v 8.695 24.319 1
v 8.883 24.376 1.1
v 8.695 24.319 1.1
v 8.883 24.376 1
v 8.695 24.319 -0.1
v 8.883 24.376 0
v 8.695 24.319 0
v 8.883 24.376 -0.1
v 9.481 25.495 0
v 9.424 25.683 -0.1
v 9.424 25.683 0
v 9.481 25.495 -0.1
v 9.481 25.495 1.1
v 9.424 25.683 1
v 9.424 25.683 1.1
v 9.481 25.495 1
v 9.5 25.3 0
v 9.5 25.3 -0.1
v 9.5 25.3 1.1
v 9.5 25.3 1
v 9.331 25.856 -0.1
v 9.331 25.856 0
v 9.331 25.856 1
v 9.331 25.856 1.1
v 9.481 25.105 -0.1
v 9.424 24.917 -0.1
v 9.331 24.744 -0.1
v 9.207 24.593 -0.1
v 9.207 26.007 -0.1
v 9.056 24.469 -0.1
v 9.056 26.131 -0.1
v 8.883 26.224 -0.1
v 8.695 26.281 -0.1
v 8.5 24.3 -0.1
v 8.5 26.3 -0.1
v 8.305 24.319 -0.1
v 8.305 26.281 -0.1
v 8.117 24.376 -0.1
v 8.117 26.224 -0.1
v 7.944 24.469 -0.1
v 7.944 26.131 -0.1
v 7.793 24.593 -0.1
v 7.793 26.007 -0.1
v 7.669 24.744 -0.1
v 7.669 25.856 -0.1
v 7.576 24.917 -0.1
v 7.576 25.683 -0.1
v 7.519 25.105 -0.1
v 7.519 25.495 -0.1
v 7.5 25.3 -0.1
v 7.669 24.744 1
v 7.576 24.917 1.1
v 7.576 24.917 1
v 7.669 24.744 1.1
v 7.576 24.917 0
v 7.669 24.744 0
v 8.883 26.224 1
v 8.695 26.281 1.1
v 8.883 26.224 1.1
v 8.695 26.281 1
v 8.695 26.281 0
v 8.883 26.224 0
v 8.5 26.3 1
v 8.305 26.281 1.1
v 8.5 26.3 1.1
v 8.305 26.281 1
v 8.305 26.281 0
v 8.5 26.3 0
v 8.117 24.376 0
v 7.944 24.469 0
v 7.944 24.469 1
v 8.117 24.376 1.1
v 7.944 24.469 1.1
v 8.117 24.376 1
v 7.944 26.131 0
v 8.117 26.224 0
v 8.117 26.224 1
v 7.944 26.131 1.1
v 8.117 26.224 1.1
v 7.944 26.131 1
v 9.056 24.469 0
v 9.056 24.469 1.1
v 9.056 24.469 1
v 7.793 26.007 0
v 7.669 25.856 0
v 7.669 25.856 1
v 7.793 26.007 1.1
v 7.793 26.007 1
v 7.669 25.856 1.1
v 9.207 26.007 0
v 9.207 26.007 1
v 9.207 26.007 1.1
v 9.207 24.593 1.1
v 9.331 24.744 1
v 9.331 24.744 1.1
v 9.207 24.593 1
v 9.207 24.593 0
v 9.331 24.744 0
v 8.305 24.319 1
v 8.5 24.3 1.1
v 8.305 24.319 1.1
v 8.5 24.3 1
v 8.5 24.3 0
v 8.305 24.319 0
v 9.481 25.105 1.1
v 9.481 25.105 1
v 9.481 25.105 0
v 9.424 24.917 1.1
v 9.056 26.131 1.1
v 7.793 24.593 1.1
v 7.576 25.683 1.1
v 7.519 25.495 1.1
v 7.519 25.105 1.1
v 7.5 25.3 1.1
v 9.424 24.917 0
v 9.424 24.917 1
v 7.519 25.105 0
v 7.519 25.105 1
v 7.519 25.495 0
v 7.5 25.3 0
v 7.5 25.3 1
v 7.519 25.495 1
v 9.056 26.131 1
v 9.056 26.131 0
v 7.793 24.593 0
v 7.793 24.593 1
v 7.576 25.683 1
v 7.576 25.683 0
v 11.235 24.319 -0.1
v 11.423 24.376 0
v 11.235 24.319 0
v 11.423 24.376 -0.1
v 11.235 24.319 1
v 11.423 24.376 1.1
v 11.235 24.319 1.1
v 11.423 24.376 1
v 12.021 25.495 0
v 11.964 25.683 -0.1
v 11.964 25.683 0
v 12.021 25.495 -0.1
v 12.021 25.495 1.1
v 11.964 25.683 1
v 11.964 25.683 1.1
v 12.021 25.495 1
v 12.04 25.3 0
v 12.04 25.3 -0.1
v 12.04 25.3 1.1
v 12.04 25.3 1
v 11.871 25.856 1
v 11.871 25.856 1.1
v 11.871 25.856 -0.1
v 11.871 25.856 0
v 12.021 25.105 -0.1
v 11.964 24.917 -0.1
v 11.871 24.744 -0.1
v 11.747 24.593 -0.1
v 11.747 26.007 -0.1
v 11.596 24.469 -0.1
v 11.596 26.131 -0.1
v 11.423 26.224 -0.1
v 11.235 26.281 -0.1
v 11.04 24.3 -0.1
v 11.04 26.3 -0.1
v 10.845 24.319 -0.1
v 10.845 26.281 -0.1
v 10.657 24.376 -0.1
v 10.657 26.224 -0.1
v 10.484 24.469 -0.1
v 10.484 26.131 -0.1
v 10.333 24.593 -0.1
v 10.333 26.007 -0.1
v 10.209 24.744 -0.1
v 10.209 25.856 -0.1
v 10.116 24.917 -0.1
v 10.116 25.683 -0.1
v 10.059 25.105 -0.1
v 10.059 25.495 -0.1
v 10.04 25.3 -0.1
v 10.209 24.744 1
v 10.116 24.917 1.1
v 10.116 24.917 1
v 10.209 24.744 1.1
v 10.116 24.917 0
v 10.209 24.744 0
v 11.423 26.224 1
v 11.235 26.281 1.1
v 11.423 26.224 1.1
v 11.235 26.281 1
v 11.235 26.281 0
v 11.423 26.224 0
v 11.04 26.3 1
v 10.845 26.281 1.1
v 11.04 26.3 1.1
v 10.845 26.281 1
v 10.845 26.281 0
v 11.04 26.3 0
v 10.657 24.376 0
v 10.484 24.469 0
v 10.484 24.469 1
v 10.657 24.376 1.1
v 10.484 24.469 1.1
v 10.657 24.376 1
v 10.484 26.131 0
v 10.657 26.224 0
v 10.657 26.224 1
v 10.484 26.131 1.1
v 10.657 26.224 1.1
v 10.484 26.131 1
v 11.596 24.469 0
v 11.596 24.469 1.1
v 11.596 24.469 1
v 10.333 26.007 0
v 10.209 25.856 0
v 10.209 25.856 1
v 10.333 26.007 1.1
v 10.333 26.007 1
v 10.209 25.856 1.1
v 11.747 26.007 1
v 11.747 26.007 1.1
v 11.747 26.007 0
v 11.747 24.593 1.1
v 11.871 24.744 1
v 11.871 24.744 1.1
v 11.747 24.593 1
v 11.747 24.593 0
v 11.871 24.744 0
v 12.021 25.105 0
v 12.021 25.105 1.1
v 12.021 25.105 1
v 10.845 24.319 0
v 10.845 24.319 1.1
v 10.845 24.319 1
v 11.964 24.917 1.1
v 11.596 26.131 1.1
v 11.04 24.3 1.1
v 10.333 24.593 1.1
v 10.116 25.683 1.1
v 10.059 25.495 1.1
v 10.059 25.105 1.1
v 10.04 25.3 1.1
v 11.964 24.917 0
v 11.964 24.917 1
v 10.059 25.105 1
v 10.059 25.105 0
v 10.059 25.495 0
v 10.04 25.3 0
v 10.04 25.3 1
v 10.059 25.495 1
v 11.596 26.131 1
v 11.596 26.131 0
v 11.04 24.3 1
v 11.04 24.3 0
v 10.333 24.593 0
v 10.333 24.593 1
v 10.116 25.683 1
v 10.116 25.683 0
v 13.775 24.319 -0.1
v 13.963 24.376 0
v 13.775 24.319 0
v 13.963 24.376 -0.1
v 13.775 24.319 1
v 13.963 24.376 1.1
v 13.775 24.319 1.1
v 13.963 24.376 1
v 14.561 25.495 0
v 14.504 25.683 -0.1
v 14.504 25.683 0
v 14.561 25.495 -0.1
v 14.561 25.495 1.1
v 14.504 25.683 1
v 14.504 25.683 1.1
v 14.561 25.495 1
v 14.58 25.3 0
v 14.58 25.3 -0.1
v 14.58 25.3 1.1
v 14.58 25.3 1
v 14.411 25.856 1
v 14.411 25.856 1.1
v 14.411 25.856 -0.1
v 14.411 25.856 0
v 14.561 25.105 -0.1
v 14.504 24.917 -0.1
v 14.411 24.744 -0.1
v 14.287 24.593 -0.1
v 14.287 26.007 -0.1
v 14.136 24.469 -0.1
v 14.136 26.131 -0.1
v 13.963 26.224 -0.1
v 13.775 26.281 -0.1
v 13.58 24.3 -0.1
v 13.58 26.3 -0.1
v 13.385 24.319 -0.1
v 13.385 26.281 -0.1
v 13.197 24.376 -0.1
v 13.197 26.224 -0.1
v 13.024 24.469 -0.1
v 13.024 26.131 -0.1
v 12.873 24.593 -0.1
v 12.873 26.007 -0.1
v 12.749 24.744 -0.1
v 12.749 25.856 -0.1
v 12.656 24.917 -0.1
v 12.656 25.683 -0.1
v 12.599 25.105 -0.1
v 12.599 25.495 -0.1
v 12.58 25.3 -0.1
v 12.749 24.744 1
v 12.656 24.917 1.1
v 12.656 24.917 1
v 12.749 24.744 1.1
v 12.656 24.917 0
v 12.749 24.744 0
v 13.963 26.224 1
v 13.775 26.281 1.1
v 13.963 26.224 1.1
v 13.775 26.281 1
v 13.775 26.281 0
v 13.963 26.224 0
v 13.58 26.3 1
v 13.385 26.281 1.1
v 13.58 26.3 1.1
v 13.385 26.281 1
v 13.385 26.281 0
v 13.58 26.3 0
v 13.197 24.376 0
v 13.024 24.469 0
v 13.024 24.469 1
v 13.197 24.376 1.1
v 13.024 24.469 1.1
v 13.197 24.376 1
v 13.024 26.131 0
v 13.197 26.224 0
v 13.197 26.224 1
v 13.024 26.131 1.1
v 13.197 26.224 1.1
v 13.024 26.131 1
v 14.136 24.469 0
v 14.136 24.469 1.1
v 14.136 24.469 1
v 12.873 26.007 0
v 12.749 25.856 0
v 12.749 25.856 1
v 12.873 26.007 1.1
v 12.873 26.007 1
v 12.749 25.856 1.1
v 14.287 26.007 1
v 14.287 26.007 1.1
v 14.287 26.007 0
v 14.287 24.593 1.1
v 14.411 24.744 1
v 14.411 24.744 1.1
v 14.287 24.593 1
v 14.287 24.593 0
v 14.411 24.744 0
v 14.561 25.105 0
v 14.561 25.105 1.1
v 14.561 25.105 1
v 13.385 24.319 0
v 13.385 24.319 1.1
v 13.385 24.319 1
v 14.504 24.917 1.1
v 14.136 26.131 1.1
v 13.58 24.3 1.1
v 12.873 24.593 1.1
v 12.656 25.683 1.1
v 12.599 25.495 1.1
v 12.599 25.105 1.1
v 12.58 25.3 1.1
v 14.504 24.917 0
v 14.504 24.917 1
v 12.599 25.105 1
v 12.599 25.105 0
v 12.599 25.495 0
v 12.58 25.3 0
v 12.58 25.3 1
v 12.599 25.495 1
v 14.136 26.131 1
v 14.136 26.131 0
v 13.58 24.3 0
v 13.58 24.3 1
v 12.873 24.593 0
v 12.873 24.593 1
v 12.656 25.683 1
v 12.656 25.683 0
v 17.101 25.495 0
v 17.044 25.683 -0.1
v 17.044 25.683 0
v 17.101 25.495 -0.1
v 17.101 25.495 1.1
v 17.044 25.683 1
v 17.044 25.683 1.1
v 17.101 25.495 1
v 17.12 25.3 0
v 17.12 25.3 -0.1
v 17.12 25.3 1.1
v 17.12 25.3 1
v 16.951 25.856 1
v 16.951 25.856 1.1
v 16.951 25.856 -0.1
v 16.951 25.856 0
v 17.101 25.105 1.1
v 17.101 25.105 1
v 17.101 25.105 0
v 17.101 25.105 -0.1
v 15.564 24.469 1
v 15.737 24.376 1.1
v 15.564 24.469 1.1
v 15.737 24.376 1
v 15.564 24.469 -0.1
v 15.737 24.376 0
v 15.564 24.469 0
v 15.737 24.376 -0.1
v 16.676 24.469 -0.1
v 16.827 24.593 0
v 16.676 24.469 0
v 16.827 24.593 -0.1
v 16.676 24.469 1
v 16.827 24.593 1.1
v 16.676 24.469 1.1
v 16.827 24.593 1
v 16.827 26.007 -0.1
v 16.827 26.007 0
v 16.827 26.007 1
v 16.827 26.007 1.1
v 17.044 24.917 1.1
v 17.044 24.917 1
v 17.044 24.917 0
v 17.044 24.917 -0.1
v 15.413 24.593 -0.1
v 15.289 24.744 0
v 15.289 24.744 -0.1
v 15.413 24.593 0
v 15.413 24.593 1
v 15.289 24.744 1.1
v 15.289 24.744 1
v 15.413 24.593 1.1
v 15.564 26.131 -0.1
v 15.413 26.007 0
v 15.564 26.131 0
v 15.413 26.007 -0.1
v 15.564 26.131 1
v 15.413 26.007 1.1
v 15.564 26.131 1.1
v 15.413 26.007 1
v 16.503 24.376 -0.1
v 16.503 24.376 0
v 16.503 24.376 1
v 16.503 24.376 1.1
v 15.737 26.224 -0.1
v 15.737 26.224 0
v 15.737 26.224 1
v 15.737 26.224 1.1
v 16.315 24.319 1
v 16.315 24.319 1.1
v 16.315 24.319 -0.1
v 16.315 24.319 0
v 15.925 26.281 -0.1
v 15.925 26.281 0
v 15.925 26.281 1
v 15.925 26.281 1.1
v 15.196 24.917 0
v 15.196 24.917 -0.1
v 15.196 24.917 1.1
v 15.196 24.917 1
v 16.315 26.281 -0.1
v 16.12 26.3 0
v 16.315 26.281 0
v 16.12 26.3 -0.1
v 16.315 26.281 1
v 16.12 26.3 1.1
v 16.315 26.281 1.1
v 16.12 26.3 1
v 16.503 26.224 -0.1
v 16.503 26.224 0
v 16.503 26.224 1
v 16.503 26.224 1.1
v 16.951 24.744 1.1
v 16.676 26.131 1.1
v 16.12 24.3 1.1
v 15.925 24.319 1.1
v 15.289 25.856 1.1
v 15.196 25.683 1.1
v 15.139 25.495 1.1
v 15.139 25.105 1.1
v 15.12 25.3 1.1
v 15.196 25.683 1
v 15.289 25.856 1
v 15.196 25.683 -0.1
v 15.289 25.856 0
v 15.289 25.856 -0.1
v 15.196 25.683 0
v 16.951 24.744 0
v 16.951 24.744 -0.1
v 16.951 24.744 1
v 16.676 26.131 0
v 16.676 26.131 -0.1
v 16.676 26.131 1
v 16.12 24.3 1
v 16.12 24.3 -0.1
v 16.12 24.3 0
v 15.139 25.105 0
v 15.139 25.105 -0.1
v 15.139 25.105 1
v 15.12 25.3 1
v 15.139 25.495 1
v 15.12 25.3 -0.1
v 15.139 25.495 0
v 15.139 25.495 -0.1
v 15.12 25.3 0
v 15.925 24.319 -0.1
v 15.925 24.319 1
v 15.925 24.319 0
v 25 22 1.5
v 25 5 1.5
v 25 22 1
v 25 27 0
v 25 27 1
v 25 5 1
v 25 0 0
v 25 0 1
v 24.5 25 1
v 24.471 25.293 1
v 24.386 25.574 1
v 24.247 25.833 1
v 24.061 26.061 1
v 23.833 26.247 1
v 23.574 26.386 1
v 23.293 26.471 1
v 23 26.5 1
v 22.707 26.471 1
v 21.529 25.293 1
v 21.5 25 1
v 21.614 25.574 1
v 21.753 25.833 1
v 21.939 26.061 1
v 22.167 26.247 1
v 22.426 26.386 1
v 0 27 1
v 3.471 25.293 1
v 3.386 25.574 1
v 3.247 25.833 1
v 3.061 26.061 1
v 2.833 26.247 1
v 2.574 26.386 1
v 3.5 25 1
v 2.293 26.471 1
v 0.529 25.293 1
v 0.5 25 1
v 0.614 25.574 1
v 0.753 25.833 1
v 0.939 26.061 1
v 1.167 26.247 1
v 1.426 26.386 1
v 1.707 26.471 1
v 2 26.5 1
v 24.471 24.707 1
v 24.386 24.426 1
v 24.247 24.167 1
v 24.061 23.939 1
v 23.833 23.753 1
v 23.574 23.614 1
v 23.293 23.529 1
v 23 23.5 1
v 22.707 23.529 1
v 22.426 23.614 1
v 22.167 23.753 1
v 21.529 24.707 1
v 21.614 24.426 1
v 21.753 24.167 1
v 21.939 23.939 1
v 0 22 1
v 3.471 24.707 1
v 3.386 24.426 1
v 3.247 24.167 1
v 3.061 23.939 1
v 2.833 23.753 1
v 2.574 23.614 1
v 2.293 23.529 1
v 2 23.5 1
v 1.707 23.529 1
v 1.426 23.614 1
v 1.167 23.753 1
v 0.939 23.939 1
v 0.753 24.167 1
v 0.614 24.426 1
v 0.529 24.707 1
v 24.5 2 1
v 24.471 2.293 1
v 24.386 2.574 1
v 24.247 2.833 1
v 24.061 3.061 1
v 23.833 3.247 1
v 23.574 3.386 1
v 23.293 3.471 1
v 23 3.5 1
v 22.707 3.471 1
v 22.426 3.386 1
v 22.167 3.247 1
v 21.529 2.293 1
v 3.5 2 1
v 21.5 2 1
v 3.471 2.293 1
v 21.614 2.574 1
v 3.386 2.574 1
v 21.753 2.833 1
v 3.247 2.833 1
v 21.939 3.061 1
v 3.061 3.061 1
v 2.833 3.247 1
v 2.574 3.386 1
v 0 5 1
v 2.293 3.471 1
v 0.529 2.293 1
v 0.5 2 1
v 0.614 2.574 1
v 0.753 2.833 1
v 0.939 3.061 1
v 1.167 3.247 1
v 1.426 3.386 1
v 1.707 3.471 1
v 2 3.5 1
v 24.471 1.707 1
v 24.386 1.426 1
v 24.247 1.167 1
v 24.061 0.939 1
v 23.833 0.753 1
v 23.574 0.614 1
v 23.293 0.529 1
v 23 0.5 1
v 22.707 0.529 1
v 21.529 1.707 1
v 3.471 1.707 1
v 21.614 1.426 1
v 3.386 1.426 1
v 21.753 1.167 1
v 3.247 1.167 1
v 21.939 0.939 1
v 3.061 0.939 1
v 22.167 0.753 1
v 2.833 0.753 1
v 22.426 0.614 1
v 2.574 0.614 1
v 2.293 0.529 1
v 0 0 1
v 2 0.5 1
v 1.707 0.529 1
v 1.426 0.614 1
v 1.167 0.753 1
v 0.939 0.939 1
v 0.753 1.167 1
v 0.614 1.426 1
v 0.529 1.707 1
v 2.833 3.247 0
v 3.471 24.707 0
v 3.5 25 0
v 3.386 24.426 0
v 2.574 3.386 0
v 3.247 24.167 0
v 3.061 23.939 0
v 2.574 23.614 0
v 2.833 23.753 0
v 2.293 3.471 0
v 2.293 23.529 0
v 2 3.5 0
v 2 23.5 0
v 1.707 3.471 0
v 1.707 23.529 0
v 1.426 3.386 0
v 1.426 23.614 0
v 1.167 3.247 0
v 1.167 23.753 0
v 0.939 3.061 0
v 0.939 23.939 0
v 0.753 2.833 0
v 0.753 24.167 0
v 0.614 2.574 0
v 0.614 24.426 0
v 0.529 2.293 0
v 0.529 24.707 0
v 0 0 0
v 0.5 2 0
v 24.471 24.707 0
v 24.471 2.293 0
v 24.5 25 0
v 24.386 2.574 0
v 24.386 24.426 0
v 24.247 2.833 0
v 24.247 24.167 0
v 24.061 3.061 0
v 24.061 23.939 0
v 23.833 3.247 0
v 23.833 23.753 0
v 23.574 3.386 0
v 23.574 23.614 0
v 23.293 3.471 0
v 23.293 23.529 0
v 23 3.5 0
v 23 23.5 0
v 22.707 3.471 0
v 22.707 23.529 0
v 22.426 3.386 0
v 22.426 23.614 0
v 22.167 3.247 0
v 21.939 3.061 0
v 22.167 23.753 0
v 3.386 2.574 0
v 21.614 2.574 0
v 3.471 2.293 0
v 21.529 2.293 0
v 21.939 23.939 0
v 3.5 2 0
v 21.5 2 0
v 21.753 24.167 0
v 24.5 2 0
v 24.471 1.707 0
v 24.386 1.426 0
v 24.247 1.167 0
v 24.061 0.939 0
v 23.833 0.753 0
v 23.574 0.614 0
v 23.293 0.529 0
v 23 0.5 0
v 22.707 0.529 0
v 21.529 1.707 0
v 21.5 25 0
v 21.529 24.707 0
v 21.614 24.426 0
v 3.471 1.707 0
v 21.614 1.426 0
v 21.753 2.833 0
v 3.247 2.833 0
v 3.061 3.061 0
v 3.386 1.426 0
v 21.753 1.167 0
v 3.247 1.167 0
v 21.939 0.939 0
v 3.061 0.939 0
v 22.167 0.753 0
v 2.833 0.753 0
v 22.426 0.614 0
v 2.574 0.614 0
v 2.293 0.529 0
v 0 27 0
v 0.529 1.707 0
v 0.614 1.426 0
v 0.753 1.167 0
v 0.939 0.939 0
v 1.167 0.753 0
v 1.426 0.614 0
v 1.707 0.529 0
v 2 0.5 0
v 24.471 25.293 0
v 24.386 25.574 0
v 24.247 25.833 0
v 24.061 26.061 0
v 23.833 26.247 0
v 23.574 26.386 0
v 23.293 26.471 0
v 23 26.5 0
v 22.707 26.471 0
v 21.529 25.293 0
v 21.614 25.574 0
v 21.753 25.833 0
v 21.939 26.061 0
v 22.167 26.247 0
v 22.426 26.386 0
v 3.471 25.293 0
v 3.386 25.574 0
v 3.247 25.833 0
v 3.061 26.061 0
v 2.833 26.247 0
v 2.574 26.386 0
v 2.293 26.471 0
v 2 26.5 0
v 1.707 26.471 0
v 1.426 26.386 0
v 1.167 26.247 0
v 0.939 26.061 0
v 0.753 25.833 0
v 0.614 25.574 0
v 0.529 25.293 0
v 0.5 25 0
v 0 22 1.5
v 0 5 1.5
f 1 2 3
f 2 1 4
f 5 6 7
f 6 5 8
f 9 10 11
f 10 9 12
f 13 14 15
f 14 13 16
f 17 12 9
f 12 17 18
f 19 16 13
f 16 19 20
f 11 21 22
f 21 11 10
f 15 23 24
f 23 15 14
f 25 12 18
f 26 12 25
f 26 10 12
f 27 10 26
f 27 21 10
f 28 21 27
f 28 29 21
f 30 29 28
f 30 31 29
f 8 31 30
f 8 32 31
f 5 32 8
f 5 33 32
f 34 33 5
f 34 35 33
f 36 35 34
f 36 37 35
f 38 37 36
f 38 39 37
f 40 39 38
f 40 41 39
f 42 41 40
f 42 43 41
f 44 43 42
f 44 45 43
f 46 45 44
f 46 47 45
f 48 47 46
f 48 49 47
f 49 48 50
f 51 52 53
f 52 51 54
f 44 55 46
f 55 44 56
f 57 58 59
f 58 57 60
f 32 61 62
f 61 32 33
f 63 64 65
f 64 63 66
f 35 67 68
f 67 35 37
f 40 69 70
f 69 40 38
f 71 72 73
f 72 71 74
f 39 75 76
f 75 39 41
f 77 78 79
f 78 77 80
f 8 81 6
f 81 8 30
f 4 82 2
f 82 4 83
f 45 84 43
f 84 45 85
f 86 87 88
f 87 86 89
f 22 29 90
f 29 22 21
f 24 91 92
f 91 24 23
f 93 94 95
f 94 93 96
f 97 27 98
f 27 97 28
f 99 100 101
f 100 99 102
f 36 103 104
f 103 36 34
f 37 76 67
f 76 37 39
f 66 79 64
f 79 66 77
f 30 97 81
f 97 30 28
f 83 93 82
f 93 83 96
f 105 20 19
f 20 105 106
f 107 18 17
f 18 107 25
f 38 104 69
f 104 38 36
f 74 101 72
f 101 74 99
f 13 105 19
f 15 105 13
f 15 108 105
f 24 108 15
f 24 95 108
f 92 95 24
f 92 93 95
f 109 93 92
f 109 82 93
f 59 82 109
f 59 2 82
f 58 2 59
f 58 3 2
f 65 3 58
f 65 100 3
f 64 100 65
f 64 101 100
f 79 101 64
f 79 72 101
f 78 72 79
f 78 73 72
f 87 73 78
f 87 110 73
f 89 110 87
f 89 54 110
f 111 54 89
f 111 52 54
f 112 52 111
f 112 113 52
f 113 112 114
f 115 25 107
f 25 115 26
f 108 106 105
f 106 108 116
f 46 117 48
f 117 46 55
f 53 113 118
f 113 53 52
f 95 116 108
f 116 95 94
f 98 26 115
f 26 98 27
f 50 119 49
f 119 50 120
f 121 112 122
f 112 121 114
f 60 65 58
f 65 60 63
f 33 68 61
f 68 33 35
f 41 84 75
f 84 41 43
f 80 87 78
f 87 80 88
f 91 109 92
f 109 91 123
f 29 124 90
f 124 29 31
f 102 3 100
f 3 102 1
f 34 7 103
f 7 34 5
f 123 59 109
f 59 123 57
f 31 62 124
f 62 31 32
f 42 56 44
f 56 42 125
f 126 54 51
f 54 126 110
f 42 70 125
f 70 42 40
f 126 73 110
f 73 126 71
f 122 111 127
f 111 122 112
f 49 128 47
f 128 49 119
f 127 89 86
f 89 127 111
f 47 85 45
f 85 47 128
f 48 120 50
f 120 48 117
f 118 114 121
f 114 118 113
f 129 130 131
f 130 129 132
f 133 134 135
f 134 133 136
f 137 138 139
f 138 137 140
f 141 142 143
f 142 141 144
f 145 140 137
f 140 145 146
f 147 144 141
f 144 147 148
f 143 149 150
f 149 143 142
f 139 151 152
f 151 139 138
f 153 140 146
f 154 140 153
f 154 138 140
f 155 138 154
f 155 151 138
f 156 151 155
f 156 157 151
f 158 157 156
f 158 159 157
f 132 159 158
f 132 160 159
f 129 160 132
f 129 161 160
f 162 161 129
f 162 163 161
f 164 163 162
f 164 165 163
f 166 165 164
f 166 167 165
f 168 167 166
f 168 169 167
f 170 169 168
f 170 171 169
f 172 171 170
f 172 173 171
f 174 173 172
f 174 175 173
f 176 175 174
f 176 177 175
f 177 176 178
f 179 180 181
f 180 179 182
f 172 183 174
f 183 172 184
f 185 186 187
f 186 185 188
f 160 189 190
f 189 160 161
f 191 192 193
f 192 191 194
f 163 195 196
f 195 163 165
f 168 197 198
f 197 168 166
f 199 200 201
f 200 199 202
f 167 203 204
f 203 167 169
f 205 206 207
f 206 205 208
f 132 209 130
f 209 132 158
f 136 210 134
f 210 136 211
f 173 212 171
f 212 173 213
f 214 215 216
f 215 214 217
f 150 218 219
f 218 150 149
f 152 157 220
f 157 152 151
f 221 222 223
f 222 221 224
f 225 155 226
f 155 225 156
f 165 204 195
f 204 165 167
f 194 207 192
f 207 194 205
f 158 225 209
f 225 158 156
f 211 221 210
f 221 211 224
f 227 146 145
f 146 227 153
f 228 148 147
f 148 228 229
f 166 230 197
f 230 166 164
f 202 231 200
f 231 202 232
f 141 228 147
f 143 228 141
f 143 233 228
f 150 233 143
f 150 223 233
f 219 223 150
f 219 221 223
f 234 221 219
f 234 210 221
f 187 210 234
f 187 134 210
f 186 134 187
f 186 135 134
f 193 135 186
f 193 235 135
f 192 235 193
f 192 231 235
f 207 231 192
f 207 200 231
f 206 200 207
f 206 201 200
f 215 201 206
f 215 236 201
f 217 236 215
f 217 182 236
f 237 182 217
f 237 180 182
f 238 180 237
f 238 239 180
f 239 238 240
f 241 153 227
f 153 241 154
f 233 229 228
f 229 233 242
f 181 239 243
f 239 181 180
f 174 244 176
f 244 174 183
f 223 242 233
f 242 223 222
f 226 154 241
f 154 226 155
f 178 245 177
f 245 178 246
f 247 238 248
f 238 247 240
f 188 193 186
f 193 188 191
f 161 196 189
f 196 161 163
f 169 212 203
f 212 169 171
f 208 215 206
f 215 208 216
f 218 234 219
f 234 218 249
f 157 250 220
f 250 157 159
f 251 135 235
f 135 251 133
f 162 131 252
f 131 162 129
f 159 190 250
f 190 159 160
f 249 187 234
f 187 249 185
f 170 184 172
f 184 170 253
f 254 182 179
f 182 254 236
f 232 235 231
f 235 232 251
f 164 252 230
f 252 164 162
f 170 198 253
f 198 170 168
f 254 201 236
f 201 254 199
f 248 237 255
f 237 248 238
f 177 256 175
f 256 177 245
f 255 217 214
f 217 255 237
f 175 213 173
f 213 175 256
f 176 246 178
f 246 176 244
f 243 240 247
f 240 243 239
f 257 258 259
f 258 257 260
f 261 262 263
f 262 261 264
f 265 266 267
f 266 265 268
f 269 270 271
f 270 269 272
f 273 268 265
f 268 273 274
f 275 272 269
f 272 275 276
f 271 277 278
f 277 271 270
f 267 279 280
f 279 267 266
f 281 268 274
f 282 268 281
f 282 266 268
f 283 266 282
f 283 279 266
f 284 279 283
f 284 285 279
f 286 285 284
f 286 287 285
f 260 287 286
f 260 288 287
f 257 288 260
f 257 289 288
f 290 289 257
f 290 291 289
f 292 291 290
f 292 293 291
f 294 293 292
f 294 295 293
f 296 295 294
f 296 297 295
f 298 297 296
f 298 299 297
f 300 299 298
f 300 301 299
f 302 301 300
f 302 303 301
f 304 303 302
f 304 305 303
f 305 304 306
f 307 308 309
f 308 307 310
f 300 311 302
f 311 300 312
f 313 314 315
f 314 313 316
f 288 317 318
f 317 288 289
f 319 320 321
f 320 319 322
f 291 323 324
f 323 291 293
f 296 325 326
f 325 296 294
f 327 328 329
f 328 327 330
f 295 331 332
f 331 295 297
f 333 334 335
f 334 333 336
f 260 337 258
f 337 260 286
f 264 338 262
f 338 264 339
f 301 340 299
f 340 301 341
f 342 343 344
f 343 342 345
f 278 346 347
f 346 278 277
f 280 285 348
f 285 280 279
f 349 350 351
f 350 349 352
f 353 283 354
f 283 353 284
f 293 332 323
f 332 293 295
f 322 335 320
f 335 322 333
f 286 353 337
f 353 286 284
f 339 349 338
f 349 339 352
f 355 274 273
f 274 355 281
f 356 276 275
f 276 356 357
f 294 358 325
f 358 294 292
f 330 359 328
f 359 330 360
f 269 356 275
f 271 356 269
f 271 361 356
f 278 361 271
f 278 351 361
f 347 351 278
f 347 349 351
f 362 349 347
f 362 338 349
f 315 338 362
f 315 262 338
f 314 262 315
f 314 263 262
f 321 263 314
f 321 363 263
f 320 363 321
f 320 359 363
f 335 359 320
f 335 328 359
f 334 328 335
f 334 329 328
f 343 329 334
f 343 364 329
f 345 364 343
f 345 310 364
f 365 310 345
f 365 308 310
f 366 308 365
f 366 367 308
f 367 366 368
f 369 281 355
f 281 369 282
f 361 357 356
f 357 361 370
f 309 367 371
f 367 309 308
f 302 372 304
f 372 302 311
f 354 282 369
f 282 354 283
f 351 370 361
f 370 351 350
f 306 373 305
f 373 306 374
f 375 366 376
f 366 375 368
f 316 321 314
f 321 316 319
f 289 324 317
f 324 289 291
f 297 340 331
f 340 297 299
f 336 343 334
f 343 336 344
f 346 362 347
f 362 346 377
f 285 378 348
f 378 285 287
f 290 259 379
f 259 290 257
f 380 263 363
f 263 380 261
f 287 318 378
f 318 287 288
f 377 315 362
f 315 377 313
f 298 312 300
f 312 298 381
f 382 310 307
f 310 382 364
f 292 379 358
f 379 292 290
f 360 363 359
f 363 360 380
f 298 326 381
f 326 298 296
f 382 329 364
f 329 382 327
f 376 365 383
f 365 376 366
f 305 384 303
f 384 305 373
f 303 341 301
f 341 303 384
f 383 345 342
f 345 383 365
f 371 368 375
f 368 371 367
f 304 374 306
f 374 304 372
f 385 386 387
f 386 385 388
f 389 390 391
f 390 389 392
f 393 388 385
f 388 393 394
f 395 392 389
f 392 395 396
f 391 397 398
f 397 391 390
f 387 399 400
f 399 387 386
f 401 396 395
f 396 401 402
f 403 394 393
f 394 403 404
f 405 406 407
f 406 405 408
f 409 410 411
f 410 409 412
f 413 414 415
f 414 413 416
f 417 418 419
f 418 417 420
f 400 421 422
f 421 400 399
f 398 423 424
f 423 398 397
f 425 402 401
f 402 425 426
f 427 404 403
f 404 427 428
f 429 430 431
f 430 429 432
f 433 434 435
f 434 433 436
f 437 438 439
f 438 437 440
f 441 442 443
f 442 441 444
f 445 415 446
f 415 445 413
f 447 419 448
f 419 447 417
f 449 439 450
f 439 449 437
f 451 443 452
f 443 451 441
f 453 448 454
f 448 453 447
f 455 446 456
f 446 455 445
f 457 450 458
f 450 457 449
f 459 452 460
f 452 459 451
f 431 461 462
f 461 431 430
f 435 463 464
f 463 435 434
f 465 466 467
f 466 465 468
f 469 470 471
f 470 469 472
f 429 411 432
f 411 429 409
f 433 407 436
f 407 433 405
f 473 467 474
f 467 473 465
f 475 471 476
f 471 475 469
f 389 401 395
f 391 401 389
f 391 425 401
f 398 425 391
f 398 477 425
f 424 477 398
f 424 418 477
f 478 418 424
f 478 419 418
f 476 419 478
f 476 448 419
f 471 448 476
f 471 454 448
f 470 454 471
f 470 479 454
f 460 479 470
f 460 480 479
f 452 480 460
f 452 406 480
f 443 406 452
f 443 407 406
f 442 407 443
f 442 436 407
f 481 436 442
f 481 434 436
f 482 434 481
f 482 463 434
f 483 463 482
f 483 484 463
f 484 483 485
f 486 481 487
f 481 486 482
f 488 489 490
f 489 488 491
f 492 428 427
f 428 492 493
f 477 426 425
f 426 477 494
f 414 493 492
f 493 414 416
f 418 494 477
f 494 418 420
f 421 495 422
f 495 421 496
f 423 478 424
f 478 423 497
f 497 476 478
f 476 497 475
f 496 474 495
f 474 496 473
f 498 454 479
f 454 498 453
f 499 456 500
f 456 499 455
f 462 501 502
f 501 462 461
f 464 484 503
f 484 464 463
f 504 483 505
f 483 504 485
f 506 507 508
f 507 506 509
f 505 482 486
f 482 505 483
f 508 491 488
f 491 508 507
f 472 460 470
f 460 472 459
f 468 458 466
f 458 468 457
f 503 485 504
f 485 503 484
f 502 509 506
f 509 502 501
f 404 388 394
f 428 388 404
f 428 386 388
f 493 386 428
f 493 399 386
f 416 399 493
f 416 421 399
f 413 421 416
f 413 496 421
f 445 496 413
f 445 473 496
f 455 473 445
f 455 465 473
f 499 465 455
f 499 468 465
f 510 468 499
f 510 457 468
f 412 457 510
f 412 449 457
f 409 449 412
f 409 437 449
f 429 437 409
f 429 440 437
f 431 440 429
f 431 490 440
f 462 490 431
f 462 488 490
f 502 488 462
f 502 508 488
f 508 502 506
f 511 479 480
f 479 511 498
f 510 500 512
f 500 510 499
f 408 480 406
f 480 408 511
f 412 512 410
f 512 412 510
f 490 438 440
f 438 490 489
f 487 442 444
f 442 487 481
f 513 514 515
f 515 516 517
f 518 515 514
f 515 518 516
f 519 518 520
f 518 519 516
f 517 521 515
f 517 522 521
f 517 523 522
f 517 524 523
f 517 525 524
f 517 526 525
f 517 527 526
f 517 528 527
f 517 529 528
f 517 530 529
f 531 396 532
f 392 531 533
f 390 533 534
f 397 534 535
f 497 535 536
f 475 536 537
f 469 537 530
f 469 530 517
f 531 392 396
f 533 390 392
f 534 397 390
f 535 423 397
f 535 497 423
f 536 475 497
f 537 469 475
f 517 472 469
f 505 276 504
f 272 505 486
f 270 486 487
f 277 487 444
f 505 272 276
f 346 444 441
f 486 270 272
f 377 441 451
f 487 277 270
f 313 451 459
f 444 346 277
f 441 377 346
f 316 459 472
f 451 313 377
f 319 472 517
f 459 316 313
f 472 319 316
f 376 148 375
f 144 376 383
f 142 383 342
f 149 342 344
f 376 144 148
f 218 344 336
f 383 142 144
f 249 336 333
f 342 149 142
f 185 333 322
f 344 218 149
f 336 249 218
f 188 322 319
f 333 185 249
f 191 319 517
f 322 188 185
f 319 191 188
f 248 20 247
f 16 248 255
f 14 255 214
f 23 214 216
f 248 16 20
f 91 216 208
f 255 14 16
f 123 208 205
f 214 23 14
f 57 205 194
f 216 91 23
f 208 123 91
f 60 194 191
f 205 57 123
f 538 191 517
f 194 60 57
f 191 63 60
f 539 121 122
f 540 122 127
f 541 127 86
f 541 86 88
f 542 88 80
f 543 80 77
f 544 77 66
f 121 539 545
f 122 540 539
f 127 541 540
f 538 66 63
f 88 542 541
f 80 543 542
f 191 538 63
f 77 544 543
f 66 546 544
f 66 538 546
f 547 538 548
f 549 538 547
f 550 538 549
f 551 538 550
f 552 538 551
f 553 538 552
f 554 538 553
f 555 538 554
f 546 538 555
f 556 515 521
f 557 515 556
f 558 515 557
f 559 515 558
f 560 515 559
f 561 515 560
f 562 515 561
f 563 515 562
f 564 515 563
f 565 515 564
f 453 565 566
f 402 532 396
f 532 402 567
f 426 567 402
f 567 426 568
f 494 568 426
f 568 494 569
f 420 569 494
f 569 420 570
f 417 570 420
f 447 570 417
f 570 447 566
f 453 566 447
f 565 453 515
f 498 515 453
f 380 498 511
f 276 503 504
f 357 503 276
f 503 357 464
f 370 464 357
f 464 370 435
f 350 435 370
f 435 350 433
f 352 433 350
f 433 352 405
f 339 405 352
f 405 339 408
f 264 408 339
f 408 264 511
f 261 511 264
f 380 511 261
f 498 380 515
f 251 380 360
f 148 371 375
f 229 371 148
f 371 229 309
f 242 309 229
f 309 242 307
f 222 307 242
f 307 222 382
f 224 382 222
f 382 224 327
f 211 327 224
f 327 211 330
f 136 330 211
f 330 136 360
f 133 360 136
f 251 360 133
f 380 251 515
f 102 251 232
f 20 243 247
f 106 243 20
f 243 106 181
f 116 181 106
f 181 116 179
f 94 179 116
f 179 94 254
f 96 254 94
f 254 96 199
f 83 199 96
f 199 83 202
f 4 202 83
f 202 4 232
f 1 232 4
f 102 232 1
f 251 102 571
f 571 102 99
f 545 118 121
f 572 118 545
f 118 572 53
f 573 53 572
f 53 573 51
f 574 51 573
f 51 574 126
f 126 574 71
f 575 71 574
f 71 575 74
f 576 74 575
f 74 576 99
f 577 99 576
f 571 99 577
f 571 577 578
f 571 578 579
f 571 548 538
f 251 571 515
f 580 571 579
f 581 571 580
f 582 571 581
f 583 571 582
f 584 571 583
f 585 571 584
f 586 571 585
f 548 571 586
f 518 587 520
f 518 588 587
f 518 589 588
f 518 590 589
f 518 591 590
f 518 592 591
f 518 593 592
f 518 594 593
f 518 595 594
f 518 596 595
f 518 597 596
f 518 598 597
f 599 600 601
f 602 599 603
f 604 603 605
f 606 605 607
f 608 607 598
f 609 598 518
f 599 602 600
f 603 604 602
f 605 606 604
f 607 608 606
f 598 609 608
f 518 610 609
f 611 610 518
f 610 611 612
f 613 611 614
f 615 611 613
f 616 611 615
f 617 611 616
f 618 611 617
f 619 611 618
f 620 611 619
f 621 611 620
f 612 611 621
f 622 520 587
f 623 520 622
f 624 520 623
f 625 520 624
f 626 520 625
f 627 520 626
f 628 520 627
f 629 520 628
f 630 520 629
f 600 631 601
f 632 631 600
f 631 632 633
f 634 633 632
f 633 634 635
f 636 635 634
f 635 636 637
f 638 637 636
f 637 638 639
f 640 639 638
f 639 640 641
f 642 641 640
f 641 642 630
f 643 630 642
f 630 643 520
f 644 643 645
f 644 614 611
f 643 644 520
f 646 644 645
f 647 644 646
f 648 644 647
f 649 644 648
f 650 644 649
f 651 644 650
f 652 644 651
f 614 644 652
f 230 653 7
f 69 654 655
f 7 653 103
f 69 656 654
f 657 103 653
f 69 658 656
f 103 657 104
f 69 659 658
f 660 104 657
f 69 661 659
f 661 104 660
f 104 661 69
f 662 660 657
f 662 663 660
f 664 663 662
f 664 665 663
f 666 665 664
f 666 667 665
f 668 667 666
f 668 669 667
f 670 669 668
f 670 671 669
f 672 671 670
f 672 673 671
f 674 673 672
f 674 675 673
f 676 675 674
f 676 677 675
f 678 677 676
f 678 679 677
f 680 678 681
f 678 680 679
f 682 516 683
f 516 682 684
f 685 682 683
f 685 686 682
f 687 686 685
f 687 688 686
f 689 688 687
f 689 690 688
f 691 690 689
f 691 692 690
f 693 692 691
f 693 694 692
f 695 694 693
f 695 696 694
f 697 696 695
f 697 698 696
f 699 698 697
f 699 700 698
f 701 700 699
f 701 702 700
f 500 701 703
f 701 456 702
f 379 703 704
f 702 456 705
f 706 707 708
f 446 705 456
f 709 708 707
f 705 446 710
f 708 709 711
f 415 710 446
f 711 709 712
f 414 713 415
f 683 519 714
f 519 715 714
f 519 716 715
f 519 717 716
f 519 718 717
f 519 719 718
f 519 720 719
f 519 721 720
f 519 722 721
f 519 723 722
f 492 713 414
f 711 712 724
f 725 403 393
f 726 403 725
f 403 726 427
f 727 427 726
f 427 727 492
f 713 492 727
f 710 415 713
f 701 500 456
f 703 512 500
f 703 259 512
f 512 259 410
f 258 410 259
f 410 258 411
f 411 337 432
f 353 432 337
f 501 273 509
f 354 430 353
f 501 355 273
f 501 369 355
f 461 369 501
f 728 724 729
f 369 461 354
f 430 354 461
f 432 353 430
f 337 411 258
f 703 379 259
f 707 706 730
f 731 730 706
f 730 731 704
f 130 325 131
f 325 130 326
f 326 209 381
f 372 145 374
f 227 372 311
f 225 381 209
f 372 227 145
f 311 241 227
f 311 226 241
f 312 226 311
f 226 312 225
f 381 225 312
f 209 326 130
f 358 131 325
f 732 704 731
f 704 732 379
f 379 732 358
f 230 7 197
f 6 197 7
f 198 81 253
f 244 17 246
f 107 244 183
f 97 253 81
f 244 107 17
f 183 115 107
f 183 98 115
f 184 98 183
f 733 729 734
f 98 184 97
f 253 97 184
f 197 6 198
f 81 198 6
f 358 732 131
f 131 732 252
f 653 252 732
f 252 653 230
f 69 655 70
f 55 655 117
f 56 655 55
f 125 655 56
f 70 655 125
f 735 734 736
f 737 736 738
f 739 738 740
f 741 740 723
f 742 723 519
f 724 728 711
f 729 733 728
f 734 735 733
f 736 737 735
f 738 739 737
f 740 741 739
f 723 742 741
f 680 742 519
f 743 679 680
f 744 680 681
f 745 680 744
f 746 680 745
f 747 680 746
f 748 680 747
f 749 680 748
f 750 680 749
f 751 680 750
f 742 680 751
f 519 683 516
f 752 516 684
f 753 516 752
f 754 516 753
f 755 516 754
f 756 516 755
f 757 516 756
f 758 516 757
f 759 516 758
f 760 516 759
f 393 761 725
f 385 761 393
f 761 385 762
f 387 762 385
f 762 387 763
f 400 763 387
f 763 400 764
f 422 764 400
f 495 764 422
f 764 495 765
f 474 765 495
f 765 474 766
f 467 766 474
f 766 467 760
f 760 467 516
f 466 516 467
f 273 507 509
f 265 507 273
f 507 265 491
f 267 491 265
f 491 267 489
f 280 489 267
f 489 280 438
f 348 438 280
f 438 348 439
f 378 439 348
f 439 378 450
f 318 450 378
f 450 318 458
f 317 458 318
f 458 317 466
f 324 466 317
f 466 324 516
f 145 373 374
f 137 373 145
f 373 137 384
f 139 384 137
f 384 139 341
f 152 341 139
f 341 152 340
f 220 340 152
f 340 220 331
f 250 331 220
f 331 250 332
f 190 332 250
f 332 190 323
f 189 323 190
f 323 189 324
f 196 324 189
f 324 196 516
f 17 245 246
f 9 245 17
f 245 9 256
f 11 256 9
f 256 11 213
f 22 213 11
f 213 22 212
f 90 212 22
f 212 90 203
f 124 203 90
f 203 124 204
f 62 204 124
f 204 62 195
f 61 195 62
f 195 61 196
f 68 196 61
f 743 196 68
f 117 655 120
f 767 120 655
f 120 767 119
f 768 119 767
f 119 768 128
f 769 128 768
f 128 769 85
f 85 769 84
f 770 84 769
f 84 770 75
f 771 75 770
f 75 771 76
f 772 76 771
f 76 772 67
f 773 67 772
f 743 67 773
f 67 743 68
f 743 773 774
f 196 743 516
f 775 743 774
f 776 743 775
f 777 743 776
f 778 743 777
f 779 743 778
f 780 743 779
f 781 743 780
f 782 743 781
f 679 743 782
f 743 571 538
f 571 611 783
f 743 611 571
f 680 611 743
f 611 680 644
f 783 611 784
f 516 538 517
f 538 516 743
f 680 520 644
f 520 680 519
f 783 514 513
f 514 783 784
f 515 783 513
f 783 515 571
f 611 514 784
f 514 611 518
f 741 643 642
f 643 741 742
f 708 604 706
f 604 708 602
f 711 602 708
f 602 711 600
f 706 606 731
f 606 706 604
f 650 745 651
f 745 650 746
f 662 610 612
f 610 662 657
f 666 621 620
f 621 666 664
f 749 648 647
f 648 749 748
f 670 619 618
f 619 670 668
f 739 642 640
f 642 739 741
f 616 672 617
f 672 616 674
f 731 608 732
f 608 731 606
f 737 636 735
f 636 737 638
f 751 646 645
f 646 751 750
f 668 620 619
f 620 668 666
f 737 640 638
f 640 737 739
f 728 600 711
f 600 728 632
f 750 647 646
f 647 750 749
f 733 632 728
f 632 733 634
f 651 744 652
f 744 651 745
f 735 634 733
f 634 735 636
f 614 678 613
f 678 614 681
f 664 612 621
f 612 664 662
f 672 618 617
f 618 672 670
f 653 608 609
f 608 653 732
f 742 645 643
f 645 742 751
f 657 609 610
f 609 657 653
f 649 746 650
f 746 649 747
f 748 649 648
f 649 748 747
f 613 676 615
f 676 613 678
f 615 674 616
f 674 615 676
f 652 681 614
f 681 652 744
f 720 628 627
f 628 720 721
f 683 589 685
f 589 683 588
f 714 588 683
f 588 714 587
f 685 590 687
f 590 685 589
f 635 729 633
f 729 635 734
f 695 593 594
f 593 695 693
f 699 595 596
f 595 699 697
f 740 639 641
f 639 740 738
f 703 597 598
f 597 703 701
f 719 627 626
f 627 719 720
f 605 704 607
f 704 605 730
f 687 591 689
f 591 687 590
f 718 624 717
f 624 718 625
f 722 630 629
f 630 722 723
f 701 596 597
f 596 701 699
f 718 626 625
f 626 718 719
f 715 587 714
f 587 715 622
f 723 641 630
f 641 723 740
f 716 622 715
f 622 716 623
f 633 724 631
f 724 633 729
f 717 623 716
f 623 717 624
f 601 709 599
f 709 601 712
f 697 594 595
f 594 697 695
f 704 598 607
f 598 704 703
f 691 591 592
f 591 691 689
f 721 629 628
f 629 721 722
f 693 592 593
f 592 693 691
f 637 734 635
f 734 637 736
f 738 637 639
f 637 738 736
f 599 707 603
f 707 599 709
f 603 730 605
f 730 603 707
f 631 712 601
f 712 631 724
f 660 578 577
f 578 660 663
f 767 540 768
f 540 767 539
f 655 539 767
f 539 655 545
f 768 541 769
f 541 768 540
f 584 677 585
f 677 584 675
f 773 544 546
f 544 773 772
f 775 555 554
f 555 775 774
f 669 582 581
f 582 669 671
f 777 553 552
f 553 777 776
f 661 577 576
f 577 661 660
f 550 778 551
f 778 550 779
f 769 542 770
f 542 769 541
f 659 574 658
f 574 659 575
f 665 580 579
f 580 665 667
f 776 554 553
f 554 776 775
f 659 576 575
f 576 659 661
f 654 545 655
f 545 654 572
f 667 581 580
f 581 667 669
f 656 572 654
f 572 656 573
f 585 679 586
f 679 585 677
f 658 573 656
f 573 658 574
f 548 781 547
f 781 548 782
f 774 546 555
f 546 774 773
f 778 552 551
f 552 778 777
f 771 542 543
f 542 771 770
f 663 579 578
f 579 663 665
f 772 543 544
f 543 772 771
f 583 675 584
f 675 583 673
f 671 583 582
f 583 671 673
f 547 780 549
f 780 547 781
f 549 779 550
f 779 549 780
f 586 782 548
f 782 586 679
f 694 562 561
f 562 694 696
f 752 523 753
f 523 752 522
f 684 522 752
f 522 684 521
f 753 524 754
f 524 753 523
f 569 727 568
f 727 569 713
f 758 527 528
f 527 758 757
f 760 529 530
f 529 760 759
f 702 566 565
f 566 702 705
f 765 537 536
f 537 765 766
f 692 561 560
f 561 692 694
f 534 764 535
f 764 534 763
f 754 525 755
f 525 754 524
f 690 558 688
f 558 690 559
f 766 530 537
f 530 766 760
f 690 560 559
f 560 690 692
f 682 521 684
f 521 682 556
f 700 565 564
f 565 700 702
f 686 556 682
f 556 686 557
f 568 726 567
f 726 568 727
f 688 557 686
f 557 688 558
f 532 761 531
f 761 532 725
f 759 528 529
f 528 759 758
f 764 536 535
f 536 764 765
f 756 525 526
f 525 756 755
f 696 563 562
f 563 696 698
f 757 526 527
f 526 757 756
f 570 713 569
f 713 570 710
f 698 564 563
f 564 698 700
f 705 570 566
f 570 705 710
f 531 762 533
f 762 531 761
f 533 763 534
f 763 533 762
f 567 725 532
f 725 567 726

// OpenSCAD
/**
 * Martin Egli
 * 2021-12-04
 * parts for vibra alarm 2
 */

module battery() {
    color("Silver")
    translate([0, 0, 0])
    cube([40, 22, 9]);
    color("Yellow")
    translate([40, 0, 0])
    cube([6, 22, 5]);
}

module chargerPCB() {
    color("Silver")
    translate([-2, (19-8)/2, 1])
    cube([6, 8, 3]);
    color("Blue")
    translate([0, 0, 0])
    cube([25, 19, 2]);
}

module arduinoMicroProPCB() {
    color("Silver")
    for(n = [0:1:5]) {
        translate([-13, 1+2.54/2+n*2.54, 1.75])
        cube([14, 1, 1]);
    }
    color("Black")
    translate([-1, 1, 1])
    cube([2.5, 16, 2.5]);
    color("Black")
    translate([15, 9.5, 1])
    rotate([0, 0, -45])
    cube([8, 8, 2]);
    color("Blue")
    translate([0, 0, 0])
    cube([34, 19, 2]);
}

module displayPCB() {
    color("Blue")
    translate([0, 0, 0])
    cube([27, 28, 1]);
    color("White")
    translate([0, 4.5, 0])
    cube([27, 19, 1.5]);
}

module displayPCB2_25x27(loc_res = 32) {
    difference() {
        union() {
            color("Gray") // Black
            translate([0, 0, 0])
            cube([25, 27, 1]);
            color("White")
            translate([0, 5, 0])
            cube([25, 17, 1.5]);
            
            color("Silver") {
                translate([8.5, 27-1.7, -0.1])
                cylinder(d = 2, h = 1.2, $fn = loc_res);
                translate([8.5+1*2.54, 27-1.7, -0.1])
                cylinder(d = 2, h = 1.2, $fn = loc_res);
                translate([8.5+2*2.54, 27-1.7, -0.1])
                cylinder(d = 2, h = 1.2, $fn = loc_res);
                translate([8.5+3*2.54, 27-1.7, -0.1])
                cylinder(d = 2, h = 1.2, $fn = loc_res);
            }
        }
        // m3 holes
        translate([2, 2, -1])
        cylinder(d = 3, h = 4, $fn = loc_res);
        translate([25-2, 2, -1])
        cylinder(d = 3, h = 4, $fn = loc_res);
        translate([2, 27-2, -1])
        cylinder(d = 3, h = 4, $fn = loc_res);
        translate([25-2, 27-2, -1])
        cylinder(d = 3, h = 4, $fn = loc_res);
    }
}

module switch() {
    color("Gray")
    translate([0, 0, 0])
    cube([17, 13, 12]);
    color("Gray")
    translate([-2, -2, 12])
    cube([17+4, 13+4, 2]);
    color("Red")
    translate([1.5, 1.5, 14])
    rotate([0, 15, 0])
    cube([14, 10, 4]);
    color("Silver")
    translate([0.5, (13-5)/2,-7])
    cube([1, 5, 7]);
    color("Silver")
    translate([17/2-0.5, (13-5)/2,-7])
    cube([1, 5, 7]);
}

module vibraMotor() {
    color("Silver")
    cylinder(d = 10, h = 3, $fn = 32);
}

displayPCB2_25x27();
